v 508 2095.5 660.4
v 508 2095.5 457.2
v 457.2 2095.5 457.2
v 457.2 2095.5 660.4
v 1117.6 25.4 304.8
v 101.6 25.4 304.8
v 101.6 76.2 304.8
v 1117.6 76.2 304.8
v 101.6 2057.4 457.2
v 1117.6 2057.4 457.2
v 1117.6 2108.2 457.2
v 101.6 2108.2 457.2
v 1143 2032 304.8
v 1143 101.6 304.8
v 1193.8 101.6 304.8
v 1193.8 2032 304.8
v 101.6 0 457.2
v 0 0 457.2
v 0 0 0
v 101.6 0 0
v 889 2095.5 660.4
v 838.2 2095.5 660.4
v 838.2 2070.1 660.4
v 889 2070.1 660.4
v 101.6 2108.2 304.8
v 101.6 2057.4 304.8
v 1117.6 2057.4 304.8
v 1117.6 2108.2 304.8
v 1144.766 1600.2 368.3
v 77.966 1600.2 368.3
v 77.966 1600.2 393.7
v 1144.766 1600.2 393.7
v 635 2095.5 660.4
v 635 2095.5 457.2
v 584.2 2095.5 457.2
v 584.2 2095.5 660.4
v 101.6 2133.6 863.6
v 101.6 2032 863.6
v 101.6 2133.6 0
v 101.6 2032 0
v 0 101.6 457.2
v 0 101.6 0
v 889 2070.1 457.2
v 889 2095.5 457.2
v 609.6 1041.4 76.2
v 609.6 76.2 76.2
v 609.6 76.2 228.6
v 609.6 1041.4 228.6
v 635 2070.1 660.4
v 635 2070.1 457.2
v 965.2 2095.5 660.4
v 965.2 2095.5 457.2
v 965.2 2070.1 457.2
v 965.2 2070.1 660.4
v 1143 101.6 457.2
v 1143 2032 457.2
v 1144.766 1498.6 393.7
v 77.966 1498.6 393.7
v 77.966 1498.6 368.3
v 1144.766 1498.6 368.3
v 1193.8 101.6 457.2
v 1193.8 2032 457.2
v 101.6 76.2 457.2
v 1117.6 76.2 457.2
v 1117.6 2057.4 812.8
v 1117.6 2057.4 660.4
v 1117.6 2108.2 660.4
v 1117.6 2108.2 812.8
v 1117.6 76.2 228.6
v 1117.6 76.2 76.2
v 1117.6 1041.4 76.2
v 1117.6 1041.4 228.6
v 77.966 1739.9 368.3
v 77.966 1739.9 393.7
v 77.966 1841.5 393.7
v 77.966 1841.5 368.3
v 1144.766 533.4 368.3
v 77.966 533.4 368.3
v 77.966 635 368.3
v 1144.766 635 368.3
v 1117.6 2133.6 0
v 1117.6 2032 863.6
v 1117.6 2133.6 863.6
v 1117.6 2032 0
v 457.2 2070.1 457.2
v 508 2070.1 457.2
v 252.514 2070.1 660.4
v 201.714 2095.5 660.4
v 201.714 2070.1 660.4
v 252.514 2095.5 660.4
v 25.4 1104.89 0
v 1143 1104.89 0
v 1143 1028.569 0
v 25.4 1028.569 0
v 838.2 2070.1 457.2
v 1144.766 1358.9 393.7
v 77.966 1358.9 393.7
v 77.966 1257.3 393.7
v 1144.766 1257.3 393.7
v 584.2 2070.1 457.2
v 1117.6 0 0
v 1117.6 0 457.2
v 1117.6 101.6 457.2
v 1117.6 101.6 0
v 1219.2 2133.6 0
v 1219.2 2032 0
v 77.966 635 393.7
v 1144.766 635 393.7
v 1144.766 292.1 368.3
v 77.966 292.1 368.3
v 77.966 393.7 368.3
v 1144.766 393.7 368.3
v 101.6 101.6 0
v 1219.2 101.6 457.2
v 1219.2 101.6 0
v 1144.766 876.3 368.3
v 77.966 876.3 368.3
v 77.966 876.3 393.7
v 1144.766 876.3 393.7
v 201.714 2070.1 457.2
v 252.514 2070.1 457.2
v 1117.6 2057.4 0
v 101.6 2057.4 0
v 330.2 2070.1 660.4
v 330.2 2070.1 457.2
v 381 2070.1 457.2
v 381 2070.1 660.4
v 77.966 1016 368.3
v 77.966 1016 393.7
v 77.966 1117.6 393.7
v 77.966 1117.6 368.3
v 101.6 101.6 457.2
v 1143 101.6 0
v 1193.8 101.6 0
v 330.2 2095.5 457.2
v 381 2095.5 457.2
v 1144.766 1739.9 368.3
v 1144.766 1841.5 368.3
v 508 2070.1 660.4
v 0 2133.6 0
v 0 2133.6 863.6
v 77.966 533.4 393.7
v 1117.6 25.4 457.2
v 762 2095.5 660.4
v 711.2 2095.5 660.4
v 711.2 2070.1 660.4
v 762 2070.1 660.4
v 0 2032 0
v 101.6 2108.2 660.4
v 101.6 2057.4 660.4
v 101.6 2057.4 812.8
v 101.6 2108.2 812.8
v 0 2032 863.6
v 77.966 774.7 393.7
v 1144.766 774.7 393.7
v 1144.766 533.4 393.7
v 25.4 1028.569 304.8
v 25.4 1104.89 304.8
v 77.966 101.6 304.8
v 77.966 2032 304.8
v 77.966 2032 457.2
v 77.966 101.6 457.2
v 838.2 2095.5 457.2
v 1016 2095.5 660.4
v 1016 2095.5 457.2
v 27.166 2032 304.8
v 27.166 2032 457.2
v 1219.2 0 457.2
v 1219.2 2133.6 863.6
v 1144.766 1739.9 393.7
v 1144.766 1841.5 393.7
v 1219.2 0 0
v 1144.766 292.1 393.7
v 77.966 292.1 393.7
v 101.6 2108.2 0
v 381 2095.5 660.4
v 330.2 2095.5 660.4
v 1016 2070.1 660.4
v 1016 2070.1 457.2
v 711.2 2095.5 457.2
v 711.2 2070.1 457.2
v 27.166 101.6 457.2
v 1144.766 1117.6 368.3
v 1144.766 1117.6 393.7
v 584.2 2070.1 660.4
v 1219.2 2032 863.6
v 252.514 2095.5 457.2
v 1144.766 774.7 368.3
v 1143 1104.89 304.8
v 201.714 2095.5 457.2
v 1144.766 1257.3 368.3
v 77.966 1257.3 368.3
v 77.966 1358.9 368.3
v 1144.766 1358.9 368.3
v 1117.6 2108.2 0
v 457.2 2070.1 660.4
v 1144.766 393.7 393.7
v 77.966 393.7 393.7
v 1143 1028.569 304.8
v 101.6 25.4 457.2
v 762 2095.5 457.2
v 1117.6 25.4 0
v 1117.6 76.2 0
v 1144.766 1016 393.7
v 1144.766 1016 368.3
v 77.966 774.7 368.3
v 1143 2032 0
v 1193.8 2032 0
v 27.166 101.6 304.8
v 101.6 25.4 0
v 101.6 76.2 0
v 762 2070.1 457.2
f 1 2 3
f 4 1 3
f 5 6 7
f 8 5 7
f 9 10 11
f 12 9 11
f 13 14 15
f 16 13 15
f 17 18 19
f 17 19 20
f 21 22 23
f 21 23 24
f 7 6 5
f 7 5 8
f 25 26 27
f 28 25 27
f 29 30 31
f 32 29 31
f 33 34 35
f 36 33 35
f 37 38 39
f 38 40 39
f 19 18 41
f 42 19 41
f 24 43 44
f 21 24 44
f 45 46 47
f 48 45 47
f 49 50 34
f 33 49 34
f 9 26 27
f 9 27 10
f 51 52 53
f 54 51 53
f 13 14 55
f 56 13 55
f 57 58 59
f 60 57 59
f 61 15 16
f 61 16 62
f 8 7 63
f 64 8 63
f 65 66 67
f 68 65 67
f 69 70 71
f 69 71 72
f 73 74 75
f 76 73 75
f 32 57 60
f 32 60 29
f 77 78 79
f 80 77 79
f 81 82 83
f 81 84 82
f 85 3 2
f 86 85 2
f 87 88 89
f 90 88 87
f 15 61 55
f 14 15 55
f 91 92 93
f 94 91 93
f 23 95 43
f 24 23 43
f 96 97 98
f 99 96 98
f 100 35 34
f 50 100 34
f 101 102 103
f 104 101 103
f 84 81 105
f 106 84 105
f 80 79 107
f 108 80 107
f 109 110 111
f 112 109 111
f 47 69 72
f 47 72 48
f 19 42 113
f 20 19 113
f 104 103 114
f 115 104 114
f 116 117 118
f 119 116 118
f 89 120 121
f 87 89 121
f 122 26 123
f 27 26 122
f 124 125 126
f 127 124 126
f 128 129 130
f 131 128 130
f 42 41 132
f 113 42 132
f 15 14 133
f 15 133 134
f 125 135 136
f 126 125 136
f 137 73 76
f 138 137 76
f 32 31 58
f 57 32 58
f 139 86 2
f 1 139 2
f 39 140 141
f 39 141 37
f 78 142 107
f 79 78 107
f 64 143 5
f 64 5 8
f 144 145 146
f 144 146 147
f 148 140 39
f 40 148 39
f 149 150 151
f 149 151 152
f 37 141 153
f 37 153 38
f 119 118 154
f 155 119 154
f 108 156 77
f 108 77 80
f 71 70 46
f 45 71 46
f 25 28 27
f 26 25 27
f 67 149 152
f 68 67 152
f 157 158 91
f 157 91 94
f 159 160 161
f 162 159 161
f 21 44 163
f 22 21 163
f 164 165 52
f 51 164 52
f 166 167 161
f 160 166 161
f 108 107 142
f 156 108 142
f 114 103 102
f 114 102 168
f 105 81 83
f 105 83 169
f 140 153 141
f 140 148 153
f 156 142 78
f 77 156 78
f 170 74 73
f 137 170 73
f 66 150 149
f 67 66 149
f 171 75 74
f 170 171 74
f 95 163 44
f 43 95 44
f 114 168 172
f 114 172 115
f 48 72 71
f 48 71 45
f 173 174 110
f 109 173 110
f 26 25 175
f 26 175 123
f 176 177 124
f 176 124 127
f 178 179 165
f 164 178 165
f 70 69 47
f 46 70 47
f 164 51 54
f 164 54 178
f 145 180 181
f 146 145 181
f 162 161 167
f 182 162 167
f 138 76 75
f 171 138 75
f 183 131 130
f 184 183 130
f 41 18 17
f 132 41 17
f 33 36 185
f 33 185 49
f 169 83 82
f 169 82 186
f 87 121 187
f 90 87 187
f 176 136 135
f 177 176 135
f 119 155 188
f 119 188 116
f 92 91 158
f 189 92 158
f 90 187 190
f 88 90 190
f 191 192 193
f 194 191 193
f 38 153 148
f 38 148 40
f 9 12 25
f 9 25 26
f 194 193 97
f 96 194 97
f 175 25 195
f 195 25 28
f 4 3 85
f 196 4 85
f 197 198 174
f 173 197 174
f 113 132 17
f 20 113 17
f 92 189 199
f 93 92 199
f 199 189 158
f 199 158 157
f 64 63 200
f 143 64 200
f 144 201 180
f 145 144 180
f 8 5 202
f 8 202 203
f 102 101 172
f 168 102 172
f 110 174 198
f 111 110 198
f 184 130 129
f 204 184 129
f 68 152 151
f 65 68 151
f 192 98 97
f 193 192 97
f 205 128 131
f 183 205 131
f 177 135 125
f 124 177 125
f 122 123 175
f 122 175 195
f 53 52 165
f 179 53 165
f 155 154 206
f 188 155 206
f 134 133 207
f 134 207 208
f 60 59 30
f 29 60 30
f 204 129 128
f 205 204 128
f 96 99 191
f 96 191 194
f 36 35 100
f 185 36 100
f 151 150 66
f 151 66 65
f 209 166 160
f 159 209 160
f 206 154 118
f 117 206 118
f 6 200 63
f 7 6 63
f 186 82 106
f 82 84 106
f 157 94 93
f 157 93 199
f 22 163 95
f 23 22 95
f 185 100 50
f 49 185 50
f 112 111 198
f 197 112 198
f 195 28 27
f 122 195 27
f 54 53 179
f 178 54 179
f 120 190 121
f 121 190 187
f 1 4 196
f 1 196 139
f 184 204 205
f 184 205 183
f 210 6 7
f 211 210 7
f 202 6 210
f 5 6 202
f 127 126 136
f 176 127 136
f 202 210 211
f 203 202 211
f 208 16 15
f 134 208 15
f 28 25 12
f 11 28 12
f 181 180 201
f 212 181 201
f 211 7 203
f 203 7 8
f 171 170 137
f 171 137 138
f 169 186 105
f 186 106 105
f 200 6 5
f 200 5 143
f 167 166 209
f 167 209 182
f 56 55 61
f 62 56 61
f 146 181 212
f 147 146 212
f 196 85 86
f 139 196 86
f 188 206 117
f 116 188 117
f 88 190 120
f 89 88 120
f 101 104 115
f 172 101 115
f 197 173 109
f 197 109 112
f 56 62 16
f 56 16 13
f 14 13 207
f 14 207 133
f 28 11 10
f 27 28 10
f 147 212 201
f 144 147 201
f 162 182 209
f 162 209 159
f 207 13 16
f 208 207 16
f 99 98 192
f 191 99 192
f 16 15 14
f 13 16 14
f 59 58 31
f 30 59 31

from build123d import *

# Parameters (mm, degrees)
F0_W      = 1219.2
F0_H      = 2133.6
F1_DEPTH  = 609.6
F3_DEPTH  = 609.6
F4_W      = 23.6339016438
F4_H      = 152.4
F4_W_2    = 27.1660983562
F5_DEPTH  = 1930.4
F6_W      = 25.4
F6_H      = 152.4
F7_DEPTH  = 1016
F8_W      = 25.4
F8_H      = 152.4
F9_DEPTH  = 1930.4
F10_W     = 25.4
F10_H     = 152.4
F11_DEPTH = 1016
F14_DEPTH = 1066.8
F15_W     = 101.6
F15_H     = 101.6
F16_DEPTH = 254
F17_W     = 101.6
F17_H     = 101.6
F18_DEPTH = 254
F19_W     = 25.4
F19_H     = 152.4
F20_DEPTH = 1016
F22_DEPTH = 203.2
F23_W     = 101.6
F23_H     = 101.6
F24_DEPTH = 76.2
F25_DEPTH = 76.2
F12_W     = 101.6
F12_H     = 101.6
F26_W     = 101.4268994331
F26_H     = 0.2518656492
F27_DEPTH = 152.4
F28_W     = 1016
F28_H     = 50.8
F29_DEPTH = 304.8
F30_DEPTH = 304.8
F31_W     = 50.8
F31_H     = 1930.4
F32_DEPTH = 304.8
F35_W     = 76.3207674026
F35_H     = 304.8
F36_DEPTH = 1117.6
F33_W     = 508
F33_H     = 152.4
F37_DEPTH = 965.2


with BuildPart() as f1:
    # F0 (on Top) → F1 (new body)
    with BuildSketch(Plane.XY):
        with Locations((609.6, 1066.8)):
            Rectangle(F0_W, F0_H)
    extrude(amount=F1_DEPTH)

    # F2 (on face) → F3 (cut)
    with BuildSketch(Plane.XY.offset(609.6)):
        Polygon((101.6, 101.6), (101.6, 0), (1117.6, 0), (1117.6, 101.6), (1219.2, 101.6), (1219.2, 2032), (1117.6, 2032), (1117.6, 2133.6), (101.6, 2133.6), (101.6, 2032), (0, 2032), (0, 101.6), align=None)
    extrude(amount=-F3_DEPTH, mode=Mode.SUBTRACT)

    # F15 (on face) → F16 (join)
    with BuildSketch(Plane.XY.offset(609.6)):
        with Locations((1168.4, 2082.8)):
            Rectangle(F15_W, F15_H)
    extrude(amount=F16_DEPTH)

    # F17 (on face) → F18 (join)
    with BuildSketch(Plane.XY.offset(609.6)):
        with Locations((50.8, 2082.8)):
            Rectangle(F17_W, F17_H)
    extrude(amount=F18_DEPTH)

    # F23 (on face) → F24 (cut)
    with BuildSketch(Plane.XY.offset(609.6)):
        with Locations((1168.4, 50.8)):
            Rectangle(F23_W, F23_H)
    extrude(amount=-F24_DEPTH, mode=Mode.SUBTRACT)

    # F25 (cut): a face of the model
    f25_faces = [f1.faces().sort_by_distance(p)[0] for p in [
        (1168.4, 50.8, 533.4),
    ]]
    extrude(f25_faces, amount=-F25_DEPTH, mode=Mode.SUBTRACT)

    # F12 (on face) + F26 (on face) → F27 (cut)
    with BuildSketch(Plane.XY.offset(609.6)):
        with Locations((50.8, 50.8)):
            Rectangle(F12_W, F12_H)
    with BuildSketch(Plane.XY.offset(609.6)):
        with Locations((50.7134497166, 101.7259328246)):
            Rectangle(F26_W, F26_H)
    extrude(amount=-F27_DEPTH, mode=Mode.SUBTRACT)


with BuildPart() as f5:
    # F4 (on face) → F5 (new body)
    with BuildSketch(Plane.XZ.offset(-2032)):
        with Locations((38.9830491781, 381)):
            Rectangle(F4_W, F4_H)
        with Locations((64.3830491781, 381)):
            Rectangle(F4_W_2, F4_H)
    extrude(amount=F5_DEPTH)


with BuildPart() as f7:
    # F6 (on face) → F7 (new body)
    with BuildSketch(Plane.YZ.offset(101.6)):
        with Locations((38.1, 381)):
            Rectangle(F6_W, F6_H)
        with Locations((63.5, 381)):
            Rectangle(F6_W, F6_H)
    extrude(amount=F7_DEPTH)


with BuildPart() as f9:
    # F8 (on face) → F9 (new body)
    with BuildSketch(Plane(origin=(0, 101.6, 0), x_dir=(-1, 0, 0), z_dir=(0, 1, 0))):
        with Locations((-1155.7, 381)):
            Rectangle(F8_W, F8_H)
        with Locations((-1181.1, 381)):
            Rectangle(F8_W, F8_H)
    extrude(amount=F9_DEPTH)


with BuildPart() as f11:
    # F10 (on face) → F11 (new body)
    with BuildSketch(Plane(origin=(1117.6, 0, 0), x_dir=(0, -1, 0), z_dir=(-1, 0, 0))):
        with Locations((-2095.5, 381)):
            Rectangle(F10_W, F10_H)
        with Locations((-2070.1, 381)):
            Rectangle(F10_W, F10_H)
    extrude(amount=F11_DEPTH)


with BuildPart() as f14:
    # F13 (on face) → F14 (new body)
    with BuildSketch(Plane.YZ.offset(77.9660983562)):
        Polygon((292.1, 393.7), (292.1, 381), (342.9, 381), (393.7, 381), (393.7, 393.7), align=None)
        Polygon((342.9, 381), (292.1, 381), (292.1, 368.3), (393.7, 368.3), (393.7, 381), align=None)
    extrude(amount=F14_DEPTH)


with BuildPart() as f14b:
    # F13 (on face) → F14, piece 2 (new body)
    with BuildSketch(Plane.YZ.offset(77.9660983562)):
        Polygon((1739.9, 393.7), (1739.9, 381), (1790.7, 381), (1841.5, 381), (1841.5, 393.7), align=None)
        Polygon((1790.7, 381), (1739.9, 381), (1739.9, 368.3), (1841.5, 368.3), (1841.5, 381), align=None)
    extrude(amount=F14_DEPTH)


with BuildPart() as f14c:
    # F13 (on face) → F14, piece 3 (new body)
    with BuildSketch(Plane.YZ.offset(77.9660983562)):
        Polygon((1498.6, 393.7), (1498.6, 381), (1549.4, 381), (1600.2, 381), (1600.2, 393.7), align=None)
        Polygon((1549.4, 381), (1498.6, 381), (1498.6, 368.3), (1600.2, 368.3), (1600.2, 381), align=None)
    extrude(amount=F14_DEPTH)


with BuildPart() as f14d:
    # F13 (on face) → F14, piece 4 (new body)
    with BuildSketch(Plane.YZ.offset(77.9660983562)):
        Polygon((1257.3, 393.7), (1257.3, 381), (1308.1, 381), (1358.9, 381), (1358.9, 393.7), align=None)
        Polygon((1308.1, 381), (1257.3, 381), (1257.3, 368.3), (1358.9, 368.3), (1358.9, 381), align=None)
    extrude(amount=F14_DEPTH)


with BuildPart() as f14e:
    # F13 (on face) → F14, piece 5 (new body)
    with BuildSketch(Plane.YZ.offset(77.9660983562)):
        Polygon((1016, 393.7), (1016, 381), (1066.8, 381), (1117.6, 381), (1117.6, 393.7), align=None)
        Polygon((1066.8, 381), (1016, 381), (1016, 368.3), (1117.6, 368.3), (1117.6, 381), align=None)
    extrude(amount=F14_DEPTH)


with BuildPart() as f14f:
    # F13 (on face) → F14, piece 6 (new body)
    with BuildSketch(Plane.YZ.offset(77.9660983562)):
        Polygon((774.7, 393.7), (774.7, 381), (825.5, 381), (876.3, 381), (876.3, 393.7), align=None)
        Polygon((825.5, 381), (774.7, 381), (774.7, 368.3), (876.3, 368.3), (876.3, 381), align=None)
    extrude(amount=F14_DEPTH)


with BuildPart() as f14g:
    # F13 (on face) → F14, piece 7 (new body)
    with BuildSketch(Plane.YZ.offset(77.9660983562)):
        Polygon((533.4, 393.7), (533.4, 381), (584.2, 381), (635, 381), (635, 393.7), align=None)
        Polygon((584.2, 381), (533.4, 381), (533.4, 368.3), (635, 368.3), (635, 381), align=None)
    extrude(amount=F14_DEPTH)


with BuildPart() as f20:
    # F19 (on face) → F20 (new body)
    with BuildSketch(Plane.YZ.offset(101.6)):
        with Locations((2095.5, 736.6)):
            Rectangle(F19_W, F19_H)
        with Locations((2070.1, 736.6)):
            Rectangle(F19_W, F19_H)
    extrude(amount=F20_DEPTH)


with BuildPart() as f22:
    # F21 (on face) → F22 (new body)
    with BuildSketch(Plane.XY.offset(457.2)):
        Polygon((201.714379406, 2095.5), (201.714379406, 2082.8), (227.114379406, 2082.8), (252.514379406, 2082.8), (252.514379406, 2095.5), align=None)
        Polygon((227.114379406, 2082.8), (201.714379406, 2082.8), (201.714379406, 2070.1), (252.514379406, 2070.1), (252.514379406, 2082.8), align=None)
    extrude(amount=F22_DEPTH)


with BuildPart() as f22b:
    # F21 (on face) → F22, piece 2 (new body)
    with BuildSketch(Plane.XY.offset(457.2)):
        Polygon((965.2, 2095.5), (965.2, 2082.8), (990.6, 2082.8), (1016, 2082.8), (1016, 2095.5), align=None)
        Polygon((990.6, 2082.8), (965.2, 2082.8), (965.2, 2070.1), (1016, 2070.1), (1016, 2082.8), align=None)
    extrude(amount=F22_DEPTH)


with BuildPart() as f22c:
    # F21 (on face) → F22, piece 3 (new body)
    with BuildSketch(Plane.XY.offset(457.2)):
        Polygon((838.2, 2095.5), (838.2, 2082.8), (863.6, 2082.8), (889, 2082.8), (889, 2095.5), align=None)
        Polygon((863.6, 2082.8), (838.2, 2082.8), (838.2, 2070.1), (889, 2070.1), (889, 2082.8), align=None)
    extrude(amount=F22_DEPTH)


with BuildPart() as f22d:
    # F21 (on face) → F22, piece 4 (new body)
    with BuildSketch(Plane.XY.offset(457.2)):
        Polygon((711.2, 2095.5), (711.2, 2082.8), (736.6, 2082.8), (762, 2082.8), (762, 2095.5), align=None)
        Polygon((736.6, 2082.8), (711.2, 2082.8), (711.2, 2070.1), (762, 2070.1), (762, 2082.8), align=None)
    extrude(amount=F22_DEPTH)


with BuildPart() as f22e:
    # F21 (on face) → F22, piece 5 (new body)
    with BuildSketch(Plane.XY.offset(457.2)):
        Polygon((584.2, 2095.5), (584.2, 2082.8), (609.6, 2082.8), (635, 2082.8), (635, 2095.5), align=None)
        Polygon((609.6, 2082.8), (584.2, 2082.8), (584.2, 2070.1), (635, 2070.1), (635, 2082.8), align=None)
    extrude(amount=F22_DEPTH)


with BuildPart() as f22f:
    # F21 (on face) → F22, piece 6 (new body)
    with BuildSketch(Plane.XY.offset(457.2)):
        Polygon((457.2, 2095.5), (457.2, 2082.8), (482.6, 2082.8), (508, 2082.8), (508, 2095.5), align=None)
        Polygon((482.6, 2082.8), (457.2, 2082.8), (457.2, 2070.1), (508, 2070.1), (508, 2082.8), align=None)
    extrude(amount=F22_DEPTH)


with BuildPart() as f22g:
    # F21 (on face) → F22, piece 7 (new body)
    with BuildSketch(Plane.XY.offset(457.2)):
        Polygon((330.2, 2095.5), (330.2, 2082.8), (355.6, 2082.8), (381, 2082.8), (381, 2095.5), align=None)
        Polygon((355.6, 2082.8), (330.2, 2082.8), (330.2, 2070.1), (381, 2070.1), (381, 2082.8), align=None)
    extrude(amount=F22_DEPTH)


with BuildPart() as f29:
    # F28 (on face) → F29 (new body)
    with BuildSketch(Plane(origin=(0, 0, 304.8), x_dir=(1, 0, 0), z_dir=(0, 0, -1))):
        with Locations((609.6, -2082.8)):
            Rectangle(F28_W, F28_H)
    extrude(amount=F29_DEPTH)


with BuildPart() as f30:
    # F30 (new): a face of the model
    f30_faces = [f7.part.faces().sort_by_distance(p)[0] for p in [
        (609.6, 50.8, 304.8),
    ]]
    extrude(f30_faces, amount=F30_DEPTH)


with BuildPart() as f32:
    # F31 (on face) → F32 (new body)
    with BuildSketch(Plane(origin=(0, 0, 304.8), x_dir=(1, 0, 0), z_dir=(0, 0, -1))):
        with Locations((1168.4, -1066.8)):
            Rectangle(F31_W, F31_H)
    extrude(amount=F32_DEPTH)


with BuildPart() as f36:
    # F35 (on face) → F36 (new body)
    with BuildSketch(Plane(origin=(1143, 0, 0), x_dir=(0, -1, 0), z_dir=(-1, 0, 0))):
        with Locations((-1066.7298436165, 152.4)):
            Rectangle(F35_W, F35_H)
    extrude(amount=F36_DEPTH)


with BuildPart() as f37:
    # F33 (on face) → F37 (new body)
    with BuildSketch(Plane(origin=(0, 76.2, 0), x_dir=(-1, 0, 0), z_dir=(0, 1, 0))):
        with Locations((-863.6, 152.4)):
            Rectangle(F33_W, F33_H)
    extrude(amount=F37_DEPTH)


solid = Compound([f1.part, f5.part, f7.part, f9.part, f11.part, f14.part, f14b.part, f14c.part, f14d.part, f14e.part, f14f.part, f14g.part, f20.part, f22.part, f22b.part, f22c.part, f22d.part, f22e.part, f22f.part, f22g.part, f29.part, f30.part, f32.part, f36.part, f37.part])
